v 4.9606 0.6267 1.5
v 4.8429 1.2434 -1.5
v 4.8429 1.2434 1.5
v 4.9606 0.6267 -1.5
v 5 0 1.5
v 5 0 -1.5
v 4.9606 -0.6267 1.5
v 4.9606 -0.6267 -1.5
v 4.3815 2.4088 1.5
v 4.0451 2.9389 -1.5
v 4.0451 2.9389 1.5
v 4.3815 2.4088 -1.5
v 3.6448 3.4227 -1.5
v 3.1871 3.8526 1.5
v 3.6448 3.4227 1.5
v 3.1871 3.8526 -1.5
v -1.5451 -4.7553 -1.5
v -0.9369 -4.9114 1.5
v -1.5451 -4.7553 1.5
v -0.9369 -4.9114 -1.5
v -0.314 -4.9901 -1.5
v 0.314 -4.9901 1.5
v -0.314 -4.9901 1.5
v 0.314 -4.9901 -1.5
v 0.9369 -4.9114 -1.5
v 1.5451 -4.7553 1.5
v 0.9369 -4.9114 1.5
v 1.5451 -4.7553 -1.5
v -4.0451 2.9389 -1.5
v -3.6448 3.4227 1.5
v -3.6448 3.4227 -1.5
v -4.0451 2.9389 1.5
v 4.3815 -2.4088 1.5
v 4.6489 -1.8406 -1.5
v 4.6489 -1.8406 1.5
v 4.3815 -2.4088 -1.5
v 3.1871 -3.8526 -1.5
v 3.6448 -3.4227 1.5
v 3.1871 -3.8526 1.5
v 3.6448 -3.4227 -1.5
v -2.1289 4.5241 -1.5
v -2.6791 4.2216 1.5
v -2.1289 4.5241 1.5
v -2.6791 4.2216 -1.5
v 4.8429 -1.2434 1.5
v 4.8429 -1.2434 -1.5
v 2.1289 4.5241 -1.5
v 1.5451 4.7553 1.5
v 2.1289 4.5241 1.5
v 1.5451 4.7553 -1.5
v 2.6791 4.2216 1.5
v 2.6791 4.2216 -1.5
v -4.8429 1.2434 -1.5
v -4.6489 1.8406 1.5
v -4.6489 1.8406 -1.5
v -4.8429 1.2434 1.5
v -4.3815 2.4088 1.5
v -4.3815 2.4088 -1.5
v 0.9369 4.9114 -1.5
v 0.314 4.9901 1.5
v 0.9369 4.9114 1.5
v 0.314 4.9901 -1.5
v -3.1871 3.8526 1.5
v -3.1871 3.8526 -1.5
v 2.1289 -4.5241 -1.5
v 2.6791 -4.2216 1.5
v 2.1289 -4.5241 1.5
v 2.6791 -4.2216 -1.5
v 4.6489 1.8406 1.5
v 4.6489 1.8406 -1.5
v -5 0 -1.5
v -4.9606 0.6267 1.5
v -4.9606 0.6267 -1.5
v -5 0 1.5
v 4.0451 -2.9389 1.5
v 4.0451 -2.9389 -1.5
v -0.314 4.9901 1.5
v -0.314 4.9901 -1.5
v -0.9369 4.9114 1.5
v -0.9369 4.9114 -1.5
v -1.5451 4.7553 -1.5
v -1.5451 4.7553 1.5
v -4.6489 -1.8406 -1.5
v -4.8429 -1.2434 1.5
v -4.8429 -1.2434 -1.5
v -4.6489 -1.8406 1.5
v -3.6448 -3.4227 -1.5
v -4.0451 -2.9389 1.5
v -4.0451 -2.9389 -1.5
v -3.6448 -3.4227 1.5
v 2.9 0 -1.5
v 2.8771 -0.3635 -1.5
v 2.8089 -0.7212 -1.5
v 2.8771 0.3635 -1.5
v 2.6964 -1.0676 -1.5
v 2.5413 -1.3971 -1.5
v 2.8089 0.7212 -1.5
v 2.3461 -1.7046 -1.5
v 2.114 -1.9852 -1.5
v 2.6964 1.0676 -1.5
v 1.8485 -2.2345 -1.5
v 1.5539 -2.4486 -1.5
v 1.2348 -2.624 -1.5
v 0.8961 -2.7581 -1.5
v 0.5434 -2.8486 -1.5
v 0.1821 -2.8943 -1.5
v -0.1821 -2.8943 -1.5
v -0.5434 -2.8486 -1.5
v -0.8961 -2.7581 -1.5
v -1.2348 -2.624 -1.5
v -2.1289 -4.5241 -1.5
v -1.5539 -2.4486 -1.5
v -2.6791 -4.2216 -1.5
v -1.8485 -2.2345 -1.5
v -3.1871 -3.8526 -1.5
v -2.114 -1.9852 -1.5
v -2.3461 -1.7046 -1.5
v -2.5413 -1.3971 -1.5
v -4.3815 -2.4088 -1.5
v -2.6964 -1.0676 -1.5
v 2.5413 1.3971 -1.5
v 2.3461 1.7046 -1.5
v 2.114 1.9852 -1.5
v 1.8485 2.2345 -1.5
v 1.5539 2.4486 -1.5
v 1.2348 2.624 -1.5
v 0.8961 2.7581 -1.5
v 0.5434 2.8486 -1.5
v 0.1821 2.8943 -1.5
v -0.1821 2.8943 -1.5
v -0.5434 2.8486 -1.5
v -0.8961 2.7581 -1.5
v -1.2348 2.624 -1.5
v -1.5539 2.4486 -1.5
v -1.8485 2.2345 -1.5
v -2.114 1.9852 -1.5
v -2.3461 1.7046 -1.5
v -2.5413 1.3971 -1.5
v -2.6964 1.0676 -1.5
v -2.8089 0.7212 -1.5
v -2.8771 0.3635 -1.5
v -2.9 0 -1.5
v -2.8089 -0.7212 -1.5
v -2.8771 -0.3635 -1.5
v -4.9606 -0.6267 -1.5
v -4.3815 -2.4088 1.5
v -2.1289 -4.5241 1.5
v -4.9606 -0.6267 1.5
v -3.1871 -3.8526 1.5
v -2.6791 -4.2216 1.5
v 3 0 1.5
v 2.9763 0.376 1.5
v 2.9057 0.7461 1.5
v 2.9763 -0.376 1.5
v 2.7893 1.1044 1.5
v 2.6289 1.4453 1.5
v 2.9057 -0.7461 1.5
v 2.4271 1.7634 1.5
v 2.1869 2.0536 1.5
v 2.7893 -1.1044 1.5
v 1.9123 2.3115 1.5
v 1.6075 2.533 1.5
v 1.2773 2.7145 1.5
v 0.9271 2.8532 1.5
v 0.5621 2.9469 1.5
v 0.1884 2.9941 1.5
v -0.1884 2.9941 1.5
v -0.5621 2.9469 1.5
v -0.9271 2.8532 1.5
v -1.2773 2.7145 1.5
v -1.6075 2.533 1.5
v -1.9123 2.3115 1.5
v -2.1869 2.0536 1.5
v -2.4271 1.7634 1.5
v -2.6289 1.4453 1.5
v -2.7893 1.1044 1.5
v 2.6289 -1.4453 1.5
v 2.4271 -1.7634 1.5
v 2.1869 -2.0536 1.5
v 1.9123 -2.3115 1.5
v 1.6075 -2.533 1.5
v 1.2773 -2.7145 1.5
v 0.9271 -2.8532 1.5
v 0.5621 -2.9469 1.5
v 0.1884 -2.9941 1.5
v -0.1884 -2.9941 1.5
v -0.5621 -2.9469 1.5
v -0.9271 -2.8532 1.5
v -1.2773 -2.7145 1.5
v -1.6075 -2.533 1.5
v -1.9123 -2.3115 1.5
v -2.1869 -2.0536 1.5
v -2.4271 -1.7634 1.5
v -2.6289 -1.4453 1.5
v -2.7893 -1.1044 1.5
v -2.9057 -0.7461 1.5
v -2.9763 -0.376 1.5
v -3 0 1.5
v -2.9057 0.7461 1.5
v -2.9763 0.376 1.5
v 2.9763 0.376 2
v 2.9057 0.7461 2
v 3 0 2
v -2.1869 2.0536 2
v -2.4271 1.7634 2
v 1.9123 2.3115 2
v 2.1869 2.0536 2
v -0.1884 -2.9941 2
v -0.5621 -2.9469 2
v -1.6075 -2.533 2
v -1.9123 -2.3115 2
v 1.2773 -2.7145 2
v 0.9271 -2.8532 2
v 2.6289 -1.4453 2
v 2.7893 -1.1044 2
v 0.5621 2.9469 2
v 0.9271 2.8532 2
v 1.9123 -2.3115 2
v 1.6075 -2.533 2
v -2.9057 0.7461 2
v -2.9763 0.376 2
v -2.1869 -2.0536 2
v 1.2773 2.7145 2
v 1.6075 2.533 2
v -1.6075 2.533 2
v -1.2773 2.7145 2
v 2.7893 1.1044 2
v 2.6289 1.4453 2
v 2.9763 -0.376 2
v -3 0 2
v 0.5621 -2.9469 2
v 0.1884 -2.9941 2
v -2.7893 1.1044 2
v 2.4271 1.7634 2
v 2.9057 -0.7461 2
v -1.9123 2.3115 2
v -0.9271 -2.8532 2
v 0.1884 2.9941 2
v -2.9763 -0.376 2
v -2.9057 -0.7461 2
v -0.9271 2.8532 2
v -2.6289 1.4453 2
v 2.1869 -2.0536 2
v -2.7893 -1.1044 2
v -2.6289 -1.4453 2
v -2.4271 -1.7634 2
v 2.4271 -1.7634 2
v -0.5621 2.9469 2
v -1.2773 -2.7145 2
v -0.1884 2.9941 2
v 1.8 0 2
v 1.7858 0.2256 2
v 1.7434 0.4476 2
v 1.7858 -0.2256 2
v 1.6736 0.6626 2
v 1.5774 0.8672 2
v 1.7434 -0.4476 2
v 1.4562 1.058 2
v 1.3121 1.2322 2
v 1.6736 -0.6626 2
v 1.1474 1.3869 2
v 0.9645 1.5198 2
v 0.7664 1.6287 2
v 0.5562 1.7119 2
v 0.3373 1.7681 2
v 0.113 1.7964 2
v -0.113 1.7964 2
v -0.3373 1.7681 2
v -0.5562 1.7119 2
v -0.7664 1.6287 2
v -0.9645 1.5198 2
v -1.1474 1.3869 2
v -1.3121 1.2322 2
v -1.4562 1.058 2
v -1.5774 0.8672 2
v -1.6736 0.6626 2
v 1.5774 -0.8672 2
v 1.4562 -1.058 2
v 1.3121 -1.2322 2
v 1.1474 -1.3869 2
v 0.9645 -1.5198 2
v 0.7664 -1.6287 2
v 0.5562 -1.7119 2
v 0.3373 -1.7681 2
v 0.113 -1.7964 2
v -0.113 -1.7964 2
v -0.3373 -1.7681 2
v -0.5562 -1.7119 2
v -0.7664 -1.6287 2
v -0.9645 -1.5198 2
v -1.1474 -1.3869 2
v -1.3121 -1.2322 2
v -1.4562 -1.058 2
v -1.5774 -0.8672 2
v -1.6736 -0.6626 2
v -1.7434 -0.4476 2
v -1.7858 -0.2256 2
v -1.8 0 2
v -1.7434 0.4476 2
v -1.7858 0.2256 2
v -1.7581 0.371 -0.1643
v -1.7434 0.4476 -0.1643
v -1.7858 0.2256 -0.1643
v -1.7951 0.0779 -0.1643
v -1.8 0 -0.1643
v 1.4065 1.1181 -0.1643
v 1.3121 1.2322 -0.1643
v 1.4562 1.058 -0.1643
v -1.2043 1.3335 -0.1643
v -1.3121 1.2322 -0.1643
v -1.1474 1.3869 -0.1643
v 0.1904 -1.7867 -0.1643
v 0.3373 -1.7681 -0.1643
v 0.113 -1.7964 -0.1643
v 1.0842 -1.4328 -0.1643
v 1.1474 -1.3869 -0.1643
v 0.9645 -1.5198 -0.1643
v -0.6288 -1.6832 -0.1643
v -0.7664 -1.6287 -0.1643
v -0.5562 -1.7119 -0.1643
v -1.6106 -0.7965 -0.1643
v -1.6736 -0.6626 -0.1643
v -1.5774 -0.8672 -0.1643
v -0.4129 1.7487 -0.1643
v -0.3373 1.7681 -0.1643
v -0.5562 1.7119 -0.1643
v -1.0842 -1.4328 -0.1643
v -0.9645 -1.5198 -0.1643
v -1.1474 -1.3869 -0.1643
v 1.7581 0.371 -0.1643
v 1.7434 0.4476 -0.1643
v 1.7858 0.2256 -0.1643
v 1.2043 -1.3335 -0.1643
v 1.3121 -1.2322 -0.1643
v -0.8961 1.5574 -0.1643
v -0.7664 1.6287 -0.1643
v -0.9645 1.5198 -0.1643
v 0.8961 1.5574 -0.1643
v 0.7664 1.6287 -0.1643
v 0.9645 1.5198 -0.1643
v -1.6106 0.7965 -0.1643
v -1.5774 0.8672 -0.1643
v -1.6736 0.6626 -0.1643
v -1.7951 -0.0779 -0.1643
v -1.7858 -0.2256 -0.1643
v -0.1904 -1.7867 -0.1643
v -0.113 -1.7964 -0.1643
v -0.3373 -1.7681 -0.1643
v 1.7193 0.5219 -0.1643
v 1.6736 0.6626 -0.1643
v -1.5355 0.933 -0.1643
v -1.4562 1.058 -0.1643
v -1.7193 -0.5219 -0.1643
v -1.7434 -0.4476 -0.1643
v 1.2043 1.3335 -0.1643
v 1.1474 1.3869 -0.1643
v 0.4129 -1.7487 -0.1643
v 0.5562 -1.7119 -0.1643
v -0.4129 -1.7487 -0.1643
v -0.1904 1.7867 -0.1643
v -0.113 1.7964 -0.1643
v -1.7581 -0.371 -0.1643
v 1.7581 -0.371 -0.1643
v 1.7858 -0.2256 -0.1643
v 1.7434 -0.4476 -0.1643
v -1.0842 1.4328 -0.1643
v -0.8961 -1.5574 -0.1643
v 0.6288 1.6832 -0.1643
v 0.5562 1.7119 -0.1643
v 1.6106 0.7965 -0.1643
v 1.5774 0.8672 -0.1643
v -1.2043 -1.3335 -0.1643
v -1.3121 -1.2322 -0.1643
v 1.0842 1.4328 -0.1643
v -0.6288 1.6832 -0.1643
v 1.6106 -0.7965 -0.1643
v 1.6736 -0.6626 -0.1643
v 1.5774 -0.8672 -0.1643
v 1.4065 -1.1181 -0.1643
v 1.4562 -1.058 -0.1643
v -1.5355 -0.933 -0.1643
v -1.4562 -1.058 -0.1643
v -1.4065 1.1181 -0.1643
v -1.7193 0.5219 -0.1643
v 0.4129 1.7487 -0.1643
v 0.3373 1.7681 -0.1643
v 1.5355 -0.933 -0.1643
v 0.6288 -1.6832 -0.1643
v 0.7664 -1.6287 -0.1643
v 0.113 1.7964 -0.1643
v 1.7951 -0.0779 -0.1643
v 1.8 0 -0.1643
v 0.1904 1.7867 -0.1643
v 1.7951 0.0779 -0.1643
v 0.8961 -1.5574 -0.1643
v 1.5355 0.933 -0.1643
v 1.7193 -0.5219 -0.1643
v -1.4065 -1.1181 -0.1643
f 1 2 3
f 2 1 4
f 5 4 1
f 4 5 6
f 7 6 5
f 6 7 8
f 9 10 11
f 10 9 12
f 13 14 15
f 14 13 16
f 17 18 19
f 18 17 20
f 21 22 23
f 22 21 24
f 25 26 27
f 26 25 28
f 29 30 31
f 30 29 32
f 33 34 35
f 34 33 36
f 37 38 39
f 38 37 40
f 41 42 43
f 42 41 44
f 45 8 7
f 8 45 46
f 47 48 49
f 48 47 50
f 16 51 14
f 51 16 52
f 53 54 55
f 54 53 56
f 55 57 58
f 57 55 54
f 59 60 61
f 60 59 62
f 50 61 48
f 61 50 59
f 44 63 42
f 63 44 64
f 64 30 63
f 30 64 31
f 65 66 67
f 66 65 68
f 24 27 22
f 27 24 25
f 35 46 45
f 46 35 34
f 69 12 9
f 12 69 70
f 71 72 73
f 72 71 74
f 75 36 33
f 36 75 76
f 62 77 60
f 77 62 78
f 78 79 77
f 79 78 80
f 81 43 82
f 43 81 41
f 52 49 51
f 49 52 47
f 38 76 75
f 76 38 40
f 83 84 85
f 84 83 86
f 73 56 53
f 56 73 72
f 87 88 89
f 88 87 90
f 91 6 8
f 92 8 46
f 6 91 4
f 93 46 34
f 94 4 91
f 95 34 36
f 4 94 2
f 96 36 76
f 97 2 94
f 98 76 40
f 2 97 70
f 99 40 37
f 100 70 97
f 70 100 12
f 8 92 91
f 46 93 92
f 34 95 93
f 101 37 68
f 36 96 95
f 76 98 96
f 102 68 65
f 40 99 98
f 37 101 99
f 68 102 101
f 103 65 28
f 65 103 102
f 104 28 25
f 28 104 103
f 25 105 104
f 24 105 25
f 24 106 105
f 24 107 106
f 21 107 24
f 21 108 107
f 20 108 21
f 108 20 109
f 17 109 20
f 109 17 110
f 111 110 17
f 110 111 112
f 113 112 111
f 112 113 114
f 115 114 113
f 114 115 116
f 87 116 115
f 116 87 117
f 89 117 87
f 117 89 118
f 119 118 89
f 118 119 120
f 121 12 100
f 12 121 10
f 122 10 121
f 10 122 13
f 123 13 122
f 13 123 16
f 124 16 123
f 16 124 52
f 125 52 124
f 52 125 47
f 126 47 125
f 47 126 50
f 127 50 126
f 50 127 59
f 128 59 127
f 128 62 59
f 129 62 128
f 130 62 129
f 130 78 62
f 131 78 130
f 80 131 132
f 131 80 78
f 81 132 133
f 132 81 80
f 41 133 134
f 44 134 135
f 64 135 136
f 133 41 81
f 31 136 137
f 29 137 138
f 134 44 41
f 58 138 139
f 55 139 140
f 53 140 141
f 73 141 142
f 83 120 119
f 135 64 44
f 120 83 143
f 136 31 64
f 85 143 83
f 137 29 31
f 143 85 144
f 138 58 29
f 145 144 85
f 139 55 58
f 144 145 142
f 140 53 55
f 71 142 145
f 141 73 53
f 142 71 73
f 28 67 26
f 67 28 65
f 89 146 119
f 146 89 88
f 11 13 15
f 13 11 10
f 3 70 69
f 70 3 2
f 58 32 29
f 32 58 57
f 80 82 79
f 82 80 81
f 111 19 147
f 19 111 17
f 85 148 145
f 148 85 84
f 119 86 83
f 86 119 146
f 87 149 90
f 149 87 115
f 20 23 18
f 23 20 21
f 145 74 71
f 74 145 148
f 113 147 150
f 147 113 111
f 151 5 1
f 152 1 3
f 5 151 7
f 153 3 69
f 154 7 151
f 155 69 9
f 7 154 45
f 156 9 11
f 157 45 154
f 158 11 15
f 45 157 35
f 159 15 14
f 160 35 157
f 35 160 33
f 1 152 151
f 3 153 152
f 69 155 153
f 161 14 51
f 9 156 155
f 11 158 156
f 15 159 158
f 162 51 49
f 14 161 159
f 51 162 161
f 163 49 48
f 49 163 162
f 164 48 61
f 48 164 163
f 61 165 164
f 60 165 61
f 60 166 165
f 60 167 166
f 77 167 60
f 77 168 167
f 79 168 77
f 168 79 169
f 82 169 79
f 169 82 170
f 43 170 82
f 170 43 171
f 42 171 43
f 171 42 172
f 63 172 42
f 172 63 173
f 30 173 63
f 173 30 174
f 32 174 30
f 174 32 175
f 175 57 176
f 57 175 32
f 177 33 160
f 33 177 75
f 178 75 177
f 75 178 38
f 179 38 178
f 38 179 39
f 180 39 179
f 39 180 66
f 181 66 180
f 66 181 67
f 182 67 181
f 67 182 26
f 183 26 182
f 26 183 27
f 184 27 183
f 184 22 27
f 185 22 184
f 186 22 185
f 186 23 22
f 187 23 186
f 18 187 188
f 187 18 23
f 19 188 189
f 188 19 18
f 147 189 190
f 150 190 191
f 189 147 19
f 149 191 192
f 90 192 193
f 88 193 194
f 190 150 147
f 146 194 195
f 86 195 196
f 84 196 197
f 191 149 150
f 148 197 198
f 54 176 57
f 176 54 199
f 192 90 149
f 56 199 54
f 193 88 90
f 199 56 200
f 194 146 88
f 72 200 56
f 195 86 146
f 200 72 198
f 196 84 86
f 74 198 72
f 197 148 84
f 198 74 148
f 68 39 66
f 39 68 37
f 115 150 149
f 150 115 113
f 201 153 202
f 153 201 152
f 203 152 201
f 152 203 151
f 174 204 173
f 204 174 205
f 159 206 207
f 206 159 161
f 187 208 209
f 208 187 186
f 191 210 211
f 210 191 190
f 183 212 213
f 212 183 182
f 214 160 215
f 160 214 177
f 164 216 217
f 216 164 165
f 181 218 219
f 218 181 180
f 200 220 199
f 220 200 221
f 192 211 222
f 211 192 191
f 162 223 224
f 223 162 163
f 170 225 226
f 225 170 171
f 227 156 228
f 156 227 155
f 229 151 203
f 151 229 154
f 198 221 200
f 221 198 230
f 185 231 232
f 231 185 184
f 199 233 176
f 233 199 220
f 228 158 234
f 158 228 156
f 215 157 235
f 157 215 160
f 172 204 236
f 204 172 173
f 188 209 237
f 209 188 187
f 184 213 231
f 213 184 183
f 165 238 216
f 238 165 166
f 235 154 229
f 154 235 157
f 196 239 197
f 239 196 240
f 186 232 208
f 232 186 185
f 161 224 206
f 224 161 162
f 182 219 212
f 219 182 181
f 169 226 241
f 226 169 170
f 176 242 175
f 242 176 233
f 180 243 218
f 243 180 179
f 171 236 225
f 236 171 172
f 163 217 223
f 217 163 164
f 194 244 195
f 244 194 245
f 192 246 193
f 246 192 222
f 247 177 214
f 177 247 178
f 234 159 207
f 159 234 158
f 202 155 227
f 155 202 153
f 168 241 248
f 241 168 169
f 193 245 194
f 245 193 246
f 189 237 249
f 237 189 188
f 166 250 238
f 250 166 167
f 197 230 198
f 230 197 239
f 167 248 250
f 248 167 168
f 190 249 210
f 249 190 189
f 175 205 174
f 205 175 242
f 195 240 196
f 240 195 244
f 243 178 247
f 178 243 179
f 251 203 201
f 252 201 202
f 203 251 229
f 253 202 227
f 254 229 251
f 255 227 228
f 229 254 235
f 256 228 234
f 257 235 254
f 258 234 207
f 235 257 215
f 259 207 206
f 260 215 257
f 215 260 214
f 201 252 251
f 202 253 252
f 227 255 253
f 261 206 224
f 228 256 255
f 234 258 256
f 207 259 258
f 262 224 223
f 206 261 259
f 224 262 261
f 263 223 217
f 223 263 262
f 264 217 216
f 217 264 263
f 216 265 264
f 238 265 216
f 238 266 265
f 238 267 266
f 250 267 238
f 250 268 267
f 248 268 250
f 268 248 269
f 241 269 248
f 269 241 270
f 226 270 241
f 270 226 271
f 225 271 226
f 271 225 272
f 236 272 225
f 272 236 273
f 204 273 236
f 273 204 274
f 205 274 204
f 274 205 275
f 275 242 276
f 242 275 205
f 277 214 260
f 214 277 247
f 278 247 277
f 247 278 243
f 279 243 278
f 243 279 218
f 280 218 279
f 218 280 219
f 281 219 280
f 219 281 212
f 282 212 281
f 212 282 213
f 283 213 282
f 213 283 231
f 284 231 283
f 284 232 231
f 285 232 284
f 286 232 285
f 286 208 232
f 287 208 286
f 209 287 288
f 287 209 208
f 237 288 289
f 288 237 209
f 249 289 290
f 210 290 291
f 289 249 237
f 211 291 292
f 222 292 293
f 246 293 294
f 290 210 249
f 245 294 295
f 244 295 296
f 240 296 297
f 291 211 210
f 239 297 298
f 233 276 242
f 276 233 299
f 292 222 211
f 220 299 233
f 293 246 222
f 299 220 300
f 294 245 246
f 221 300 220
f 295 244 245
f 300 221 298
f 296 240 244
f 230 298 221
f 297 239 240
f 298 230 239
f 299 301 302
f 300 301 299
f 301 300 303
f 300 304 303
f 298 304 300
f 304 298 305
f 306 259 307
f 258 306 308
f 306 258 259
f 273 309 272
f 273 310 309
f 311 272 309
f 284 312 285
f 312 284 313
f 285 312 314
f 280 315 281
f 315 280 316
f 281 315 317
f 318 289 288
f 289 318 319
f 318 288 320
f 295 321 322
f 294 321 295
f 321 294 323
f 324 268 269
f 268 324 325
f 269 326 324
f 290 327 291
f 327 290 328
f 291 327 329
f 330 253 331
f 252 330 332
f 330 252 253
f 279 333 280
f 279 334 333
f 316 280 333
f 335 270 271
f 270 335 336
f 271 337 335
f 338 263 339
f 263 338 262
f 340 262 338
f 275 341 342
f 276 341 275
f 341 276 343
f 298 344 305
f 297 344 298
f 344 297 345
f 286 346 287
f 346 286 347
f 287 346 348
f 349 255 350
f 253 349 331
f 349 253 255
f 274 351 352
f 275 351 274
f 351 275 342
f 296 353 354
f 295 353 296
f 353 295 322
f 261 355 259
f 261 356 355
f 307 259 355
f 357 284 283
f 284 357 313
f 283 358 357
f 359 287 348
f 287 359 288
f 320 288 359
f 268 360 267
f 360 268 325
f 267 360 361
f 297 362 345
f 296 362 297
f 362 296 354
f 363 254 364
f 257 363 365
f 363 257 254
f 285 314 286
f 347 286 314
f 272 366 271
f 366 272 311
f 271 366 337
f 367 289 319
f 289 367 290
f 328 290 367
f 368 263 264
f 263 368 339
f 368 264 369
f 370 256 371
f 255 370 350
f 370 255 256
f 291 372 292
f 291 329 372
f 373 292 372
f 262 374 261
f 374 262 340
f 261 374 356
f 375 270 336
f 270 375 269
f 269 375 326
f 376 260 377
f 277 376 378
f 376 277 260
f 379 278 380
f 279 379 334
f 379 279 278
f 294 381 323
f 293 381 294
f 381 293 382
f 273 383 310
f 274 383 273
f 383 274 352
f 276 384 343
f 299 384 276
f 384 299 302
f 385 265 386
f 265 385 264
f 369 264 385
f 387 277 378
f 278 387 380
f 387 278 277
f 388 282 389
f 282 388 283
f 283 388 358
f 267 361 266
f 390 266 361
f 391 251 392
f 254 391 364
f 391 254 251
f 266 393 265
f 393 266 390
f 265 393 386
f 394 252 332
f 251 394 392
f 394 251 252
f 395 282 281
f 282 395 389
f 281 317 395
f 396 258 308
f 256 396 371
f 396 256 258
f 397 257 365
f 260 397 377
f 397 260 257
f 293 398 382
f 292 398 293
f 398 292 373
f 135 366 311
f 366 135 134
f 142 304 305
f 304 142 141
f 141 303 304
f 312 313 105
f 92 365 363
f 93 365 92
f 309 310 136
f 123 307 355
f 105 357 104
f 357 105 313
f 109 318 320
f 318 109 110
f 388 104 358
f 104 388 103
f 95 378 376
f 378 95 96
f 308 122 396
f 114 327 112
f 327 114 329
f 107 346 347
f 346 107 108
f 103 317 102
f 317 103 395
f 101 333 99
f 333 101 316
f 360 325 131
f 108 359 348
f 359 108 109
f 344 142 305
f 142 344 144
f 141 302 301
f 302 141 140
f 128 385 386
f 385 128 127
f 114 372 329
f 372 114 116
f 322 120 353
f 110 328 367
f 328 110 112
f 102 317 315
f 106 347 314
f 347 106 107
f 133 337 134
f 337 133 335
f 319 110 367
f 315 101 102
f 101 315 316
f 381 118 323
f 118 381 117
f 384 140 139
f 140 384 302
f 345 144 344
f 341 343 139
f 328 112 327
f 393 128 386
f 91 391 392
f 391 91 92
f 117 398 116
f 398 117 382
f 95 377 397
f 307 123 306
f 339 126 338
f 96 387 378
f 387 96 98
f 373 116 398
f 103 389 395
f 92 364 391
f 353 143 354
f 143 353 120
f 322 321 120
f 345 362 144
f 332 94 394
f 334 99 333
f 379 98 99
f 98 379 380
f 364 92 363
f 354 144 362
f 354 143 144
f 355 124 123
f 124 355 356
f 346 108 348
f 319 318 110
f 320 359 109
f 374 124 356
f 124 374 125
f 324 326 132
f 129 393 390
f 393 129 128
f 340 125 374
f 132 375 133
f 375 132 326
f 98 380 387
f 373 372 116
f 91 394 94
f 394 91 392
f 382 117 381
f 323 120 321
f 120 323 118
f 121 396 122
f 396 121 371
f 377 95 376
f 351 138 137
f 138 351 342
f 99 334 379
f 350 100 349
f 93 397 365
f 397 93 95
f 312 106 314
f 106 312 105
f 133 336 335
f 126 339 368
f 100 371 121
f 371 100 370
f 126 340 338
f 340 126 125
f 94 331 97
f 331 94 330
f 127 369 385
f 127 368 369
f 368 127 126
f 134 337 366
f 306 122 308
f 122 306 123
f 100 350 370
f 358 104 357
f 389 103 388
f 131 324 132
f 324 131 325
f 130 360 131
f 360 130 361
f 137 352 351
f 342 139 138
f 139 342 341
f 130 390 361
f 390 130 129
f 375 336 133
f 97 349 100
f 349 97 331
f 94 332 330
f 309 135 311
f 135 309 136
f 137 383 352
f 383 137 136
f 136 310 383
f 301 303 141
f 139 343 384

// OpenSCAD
$fn = 50;


difference() {
	union() {
		translate(v = [0, 0, -1.5000000000]) {
			cylinder(h = 3, r = 5.0000000000);
		}
		translate(v = [0, 0, -1.5000000000]) {
			cylinder(h = 3.5000000000, r = 3.0000000000);
		}
	}
	union() {
		translate(v = [0, 0, -1.5000000000]) {
			rotate(a = [0, 180, 0]) {
				difference() {
					union() {
						translate(v = [0, 0, -3.5000000000]) {
							cylinder(h = 3.5000000000, r = 1.5000000000);
						}
						translate(v = [0, 0, -3.5000000000]) {
							cylinder(h = 3.5000000000, r = 1.8000000000);
						}
						translate(v = [0, 0, -1.7000000000]) {
							cylinder(h = 1.7000000000, r1 = 1.5000000000, r2 = 2.9000000000);
						}
						translate(v = [0, 0, -3.5000000000]) {
							cylinder(h = 3.5000000000, r = 1.5000000000);
						}
					}
					union();
				}
			}
		}
		translate(v = [0, 0, -100.0000000000]) {
			cylinder(h = 200, r = 1.5000000000);
		}
	}
}
